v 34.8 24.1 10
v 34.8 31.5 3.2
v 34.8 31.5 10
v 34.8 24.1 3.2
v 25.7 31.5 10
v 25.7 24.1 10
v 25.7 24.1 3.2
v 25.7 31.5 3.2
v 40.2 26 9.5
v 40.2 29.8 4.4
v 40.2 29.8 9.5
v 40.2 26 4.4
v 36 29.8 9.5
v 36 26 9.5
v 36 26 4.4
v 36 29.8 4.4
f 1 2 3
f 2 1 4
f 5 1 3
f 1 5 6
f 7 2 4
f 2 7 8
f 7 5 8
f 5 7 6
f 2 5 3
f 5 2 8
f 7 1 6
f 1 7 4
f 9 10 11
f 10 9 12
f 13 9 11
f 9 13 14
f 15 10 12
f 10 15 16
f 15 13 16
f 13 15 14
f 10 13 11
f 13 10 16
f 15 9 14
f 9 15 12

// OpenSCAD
union() {
  translate([25.7, 24.1, 3.2]) cube(size=[9.1,7.4,6.8], center=false);
  translate([36.0, 26.0, 4.4]) cube(size=[4.2,3.8,5.1], center=false);
}
